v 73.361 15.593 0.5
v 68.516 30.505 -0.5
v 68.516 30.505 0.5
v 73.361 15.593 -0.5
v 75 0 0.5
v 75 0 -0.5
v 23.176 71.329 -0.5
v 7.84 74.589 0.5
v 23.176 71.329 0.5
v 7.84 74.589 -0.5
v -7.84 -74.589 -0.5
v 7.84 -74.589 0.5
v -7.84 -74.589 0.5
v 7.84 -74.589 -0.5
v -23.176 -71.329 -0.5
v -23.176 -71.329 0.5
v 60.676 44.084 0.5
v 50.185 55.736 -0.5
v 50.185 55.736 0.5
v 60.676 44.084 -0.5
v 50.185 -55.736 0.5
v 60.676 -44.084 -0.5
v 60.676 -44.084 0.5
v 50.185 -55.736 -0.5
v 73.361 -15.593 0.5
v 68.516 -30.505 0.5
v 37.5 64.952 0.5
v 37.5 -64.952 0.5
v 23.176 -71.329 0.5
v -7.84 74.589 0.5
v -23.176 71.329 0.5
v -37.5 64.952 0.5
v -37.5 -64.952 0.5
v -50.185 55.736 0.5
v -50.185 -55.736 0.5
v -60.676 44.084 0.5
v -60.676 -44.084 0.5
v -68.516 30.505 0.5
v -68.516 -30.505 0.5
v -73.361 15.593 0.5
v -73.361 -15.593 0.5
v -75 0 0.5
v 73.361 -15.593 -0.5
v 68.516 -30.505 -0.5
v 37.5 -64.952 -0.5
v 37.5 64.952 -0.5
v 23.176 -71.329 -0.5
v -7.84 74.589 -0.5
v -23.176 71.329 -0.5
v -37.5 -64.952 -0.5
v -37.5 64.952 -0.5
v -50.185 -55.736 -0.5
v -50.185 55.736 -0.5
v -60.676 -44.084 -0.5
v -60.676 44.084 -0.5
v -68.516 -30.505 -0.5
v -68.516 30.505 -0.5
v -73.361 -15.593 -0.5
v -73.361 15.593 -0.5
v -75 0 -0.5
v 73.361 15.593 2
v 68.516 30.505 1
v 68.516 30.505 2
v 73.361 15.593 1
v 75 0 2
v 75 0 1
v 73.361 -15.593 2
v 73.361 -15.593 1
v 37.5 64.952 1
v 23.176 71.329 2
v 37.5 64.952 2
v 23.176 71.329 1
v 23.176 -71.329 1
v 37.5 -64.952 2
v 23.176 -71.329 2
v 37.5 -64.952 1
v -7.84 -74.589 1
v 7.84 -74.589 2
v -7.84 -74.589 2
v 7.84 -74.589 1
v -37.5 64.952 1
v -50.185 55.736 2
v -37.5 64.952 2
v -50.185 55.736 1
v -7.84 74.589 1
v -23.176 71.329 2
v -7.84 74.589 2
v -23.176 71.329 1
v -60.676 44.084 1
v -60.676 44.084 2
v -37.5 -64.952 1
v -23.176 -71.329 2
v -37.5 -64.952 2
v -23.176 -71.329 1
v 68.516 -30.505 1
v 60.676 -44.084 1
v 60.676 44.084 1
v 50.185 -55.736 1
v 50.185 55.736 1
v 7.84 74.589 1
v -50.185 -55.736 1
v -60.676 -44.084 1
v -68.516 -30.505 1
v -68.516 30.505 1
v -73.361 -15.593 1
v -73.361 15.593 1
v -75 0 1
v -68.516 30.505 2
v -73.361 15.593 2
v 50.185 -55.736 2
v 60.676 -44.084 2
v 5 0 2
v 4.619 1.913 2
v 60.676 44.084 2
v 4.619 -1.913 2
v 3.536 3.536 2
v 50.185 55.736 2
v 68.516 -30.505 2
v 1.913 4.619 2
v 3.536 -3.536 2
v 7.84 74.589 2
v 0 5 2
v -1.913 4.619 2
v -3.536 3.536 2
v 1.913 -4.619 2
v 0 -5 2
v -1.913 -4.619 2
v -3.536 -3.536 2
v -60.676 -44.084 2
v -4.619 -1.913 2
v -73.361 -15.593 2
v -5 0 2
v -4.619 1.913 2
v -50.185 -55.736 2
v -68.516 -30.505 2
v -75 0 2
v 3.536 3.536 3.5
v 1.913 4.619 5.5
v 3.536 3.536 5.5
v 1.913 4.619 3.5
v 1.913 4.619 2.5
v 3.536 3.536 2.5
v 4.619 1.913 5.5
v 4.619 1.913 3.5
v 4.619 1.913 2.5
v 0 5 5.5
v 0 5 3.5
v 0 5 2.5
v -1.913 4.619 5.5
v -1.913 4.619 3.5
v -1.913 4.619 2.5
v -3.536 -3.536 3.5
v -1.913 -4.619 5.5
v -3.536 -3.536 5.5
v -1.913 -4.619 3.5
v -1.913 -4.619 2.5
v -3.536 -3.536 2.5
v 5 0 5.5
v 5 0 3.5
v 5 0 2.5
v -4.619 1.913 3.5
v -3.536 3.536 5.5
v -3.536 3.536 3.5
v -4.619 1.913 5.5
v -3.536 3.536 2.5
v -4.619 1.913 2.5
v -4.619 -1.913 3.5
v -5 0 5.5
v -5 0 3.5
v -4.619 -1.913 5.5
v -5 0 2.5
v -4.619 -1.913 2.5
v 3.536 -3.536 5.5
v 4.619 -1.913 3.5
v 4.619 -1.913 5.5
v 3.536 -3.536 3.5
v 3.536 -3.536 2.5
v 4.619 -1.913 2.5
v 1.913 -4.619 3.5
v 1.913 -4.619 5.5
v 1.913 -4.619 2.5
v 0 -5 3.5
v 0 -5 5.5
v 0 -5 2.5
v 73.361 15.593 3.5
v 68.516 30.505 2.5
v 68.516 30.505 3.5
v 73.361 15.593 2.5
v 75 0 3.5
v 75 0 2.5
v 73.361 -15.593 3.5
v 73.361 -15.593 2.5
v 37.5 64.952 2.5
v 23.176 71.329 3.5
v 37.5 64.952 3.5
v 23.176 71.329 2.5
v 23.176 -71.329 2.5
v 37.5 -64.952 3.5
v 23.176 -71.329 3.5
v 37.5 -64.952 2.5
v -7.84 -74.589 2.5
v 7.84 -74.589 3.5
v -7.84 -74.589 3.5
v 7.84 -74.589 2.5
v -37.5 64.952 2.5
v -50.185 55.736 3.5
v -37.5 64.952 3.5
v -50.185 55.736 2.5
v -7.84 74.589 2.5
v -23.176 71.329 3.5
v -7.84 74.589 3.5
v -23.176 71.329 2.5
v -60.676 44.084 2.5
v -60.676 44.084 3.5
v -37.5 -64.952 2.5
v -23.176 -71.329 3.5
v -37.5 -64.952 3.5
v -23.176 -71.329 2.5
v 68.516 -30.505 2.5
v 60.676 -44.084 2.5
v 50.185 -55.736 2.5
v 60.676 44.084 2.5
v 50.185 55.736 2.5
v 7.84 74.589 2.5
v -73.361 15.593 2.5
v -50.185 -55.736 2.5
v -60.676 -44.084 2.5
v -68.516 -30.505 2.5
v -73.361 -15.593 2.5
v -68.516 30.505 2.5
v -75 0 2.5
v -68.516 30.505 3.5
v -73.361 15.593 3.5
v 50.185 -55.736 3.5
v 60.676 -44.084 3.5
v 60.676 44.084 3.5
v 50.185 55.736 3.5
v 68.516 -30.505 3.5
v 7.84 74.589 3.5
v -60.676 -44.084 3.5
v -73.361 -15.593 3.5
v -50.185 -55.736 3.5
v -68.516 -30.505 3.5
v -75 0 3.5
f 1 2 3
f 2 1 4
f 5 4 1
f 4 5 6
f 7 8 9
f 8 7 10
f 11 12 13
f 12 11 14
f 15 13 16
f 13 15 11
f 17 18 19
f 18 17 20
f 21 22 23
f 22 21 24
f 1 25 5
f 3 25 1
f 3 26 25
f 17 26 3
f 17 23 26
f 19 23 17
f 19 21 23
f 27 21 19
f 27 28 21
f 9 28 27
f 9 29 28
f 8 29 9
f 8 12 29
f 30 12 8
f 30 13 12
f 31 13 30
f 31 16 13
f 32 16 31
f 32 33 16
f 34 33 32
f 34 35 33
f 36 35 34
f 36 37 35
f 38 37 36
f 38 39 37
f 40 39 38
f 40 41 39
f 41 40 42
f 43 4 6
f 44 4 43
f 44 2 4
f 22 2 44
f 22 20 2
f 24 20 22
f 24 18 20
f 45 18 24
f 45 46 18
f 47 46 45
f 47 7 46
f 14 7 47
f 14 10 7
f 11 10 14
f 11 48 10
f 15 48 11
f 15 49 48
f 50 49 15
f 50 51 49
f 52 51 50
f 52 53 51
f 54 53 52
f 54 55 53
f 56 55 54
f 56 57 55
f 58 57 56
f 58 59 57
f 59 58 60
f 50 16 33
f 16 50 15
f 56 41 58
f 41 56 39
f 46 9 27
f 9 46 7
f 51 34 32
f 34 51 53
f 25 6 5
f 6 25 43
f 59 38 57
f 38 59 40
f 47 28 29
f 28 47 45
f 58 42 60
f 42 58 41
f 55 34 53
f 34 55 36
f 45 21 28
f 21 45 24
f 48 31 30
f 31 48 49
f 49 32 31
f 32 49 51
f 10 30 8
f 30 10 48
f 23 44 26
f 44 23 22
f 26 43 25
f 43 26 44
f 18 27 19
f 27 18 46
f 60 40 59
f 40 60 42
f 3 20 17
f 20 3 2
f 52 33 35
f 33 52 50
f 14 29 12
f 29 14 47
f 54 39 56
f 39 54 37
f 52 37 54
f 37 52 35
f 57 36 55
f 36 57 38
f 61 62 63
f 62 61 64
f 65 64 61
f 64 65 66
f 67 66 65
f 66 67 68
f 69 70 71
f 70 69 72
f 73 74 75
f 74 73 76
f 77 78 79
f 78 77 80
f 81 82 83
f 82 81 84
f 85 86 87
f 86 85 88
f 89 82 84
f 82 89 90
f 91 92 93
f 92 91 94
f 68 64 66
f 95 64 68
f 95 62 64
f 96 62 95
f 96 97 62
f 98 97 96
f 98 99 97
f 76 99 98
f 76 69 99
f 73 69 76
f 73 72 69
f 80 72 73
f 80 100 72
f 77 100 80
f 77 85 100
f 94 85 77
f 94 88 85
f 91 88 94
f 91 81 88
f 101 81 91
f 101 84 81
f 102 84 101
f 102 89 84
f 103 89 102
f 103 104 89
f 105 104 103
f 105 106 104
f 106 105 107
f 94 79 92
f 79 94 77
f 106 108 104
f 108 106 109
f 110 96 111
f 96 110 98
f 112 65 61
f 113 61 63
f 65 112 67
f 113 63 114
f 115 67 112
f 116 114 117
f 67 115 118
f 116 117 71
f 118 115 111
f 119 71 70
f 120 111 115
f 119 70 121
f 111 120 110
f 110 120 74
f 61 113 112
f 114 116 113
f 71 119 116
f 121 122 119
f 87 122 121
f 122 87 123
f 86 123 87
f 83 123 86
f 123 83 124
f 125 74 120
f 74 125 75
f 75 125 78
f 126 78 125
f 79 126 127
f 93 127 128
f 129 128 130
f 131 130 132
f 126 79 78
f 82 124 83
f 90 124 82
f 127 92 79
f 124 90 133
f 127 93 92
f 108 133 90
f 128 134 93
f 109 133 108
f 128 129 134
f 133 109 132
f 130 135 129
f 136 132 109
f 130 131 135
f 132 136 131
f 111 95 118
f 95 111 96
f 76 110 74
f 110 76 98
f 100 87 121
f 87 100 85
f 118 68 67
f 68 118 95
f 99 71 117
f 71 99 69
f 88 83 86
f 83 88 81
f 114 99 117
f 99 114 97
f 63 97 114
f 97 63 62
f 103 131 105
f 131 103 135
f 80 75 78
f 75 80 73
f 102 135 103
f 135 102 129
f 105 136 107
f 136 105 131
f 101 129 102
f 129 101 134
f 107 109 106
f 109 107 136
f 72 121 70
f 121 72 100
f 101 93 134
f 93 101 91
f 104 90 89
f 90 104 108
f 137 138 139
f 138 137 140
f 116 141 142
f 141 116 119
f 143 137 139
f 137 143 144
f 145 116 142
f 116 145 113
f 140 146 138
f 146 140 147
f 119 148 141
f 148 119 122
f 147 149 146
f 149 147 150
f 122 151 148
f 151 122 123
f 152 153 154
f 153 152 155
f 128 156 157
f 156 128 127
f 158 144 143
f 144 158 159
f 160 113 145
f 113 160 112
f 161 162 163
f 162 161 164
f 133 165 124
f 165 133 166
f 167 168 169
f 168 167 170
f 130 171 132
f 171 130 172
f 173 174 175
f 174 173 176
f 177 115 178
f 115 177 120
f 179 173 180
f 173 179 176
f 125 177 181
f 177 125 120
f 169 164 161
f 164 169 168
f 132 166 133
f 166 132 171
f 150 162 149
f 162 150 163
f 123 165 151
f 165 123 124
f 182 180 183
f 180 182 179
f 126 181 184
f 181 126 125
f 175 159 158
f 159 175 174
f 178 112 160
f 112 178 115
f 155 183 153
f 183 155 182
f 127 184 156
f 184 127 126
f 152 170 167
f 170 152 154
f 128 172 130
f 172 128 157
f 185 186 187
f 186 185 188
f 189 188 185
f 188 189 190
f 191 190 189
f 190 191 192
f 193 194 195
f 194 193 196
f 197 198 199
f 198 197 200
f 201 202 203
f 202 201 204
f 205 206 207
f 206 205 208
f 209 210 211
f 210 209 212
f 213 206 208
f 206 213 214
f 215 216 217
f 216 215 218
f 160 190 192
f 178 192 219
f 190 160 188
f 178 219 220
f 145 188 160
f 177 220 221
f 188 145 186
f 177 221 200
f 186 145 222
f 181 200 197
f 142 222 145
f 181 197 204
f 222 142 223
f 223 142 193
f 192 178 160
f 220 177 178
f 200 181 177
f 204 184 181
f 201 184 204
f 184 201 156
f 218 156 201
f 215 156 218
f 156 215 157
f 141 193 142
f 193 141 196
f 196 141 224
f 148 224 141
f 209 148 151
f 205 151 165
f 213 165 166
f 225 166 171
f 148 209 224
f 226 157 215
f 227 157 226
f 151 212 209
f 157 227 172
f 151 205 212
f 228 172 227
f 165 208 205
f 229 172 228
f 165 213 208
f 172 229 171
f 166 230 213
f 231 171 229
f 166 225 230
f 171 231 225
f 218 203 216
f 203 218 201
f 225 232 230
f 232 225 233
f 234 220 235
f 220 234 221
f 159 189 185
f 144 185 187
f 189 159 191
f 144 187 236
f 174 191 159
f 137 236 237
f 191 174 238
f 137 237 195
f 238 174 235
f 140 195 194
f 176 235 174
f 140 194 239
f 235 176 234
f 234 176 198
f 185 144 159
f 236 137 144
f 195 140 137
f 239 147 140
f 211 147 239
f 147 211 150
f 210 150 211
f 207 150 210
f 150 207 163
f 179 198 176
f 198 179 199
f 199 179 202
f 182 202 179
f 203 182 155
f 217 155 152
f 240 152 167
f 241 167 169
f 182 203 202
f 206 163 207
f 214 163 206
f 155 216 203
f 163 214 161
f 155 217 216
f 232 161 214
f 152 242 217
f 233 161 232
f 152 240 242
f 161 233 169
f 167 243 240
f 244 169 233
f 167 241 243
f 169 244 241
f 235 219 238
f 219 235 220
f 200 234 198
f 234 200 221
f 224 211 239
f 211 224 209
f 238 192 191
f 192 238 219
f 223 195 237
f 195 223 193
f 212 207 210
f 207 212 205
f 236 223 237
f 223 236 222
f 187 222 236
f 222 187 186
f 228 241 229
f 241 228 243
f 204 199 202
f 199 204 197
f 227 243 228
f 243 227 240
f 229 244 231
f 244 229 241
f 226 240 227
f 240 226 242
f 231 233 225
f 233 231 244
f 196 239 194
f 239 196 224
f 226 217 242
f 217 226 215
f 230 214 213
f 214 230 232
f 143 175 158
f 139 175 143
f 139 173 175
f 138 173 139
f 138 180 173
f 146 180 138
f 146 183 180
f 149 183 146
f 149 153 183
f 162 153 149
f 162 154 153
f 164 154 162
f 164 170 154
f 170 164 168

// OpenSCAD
// Parameters for customization
base_diameter = 150;          // Diameter of the plates (mm)
pivot_diameter = 10;          // Diameter of the central pivot (mm)
plate_thickness = 1;          // Thickness of each stainless steel plate (mm)
air_channel_width = 20;       // Width of airflow channels (mm)
num_air_channels = 6;         // Number of airflow channels
rotation_limit = 45;          // Maximum rotation of middle and top plates (degrees)

// Main function
module air_regulator_system() {
    translate([0, 0, 0])
    base_plate();
    
    translate([0, 0, plate_thickness + 0.5])
    middle_plate();
    
    translate([0, 0, 2 * (plate_thickness + 0.5)])
    top_plate();
}

// Base Plate: Fixed component with open channels
module base_plate() {
    difference() {
        // Circular base
        cylinder(r=base_diameter / 2, h=plate_thickness, center=true);

        // Airflow channels
        for (i = [0 : 360 / num_air_channels : 360 - 360 / num_air_channels]) {
            rotate([0, 0, i])
            translate([base_diameter / 4, 0, 0])
            square_air_channel();
        }
    }
}

// Middle Plate: Rotatable component with partially overlapping channels
module middle_plate() {
    difference() {
        // Circular middle plate
        cylinder(r=base_diameter / 2, h=plate_thickness, center=true);

        // Adjustable airflow slots
        for (i = [0 : 360 / num_air_channels : 360 - 360 / num_air_channels]) {
            rotate([0, 0, i])
            translate([base_diameter / 4, 0, 0])
            square_air_channel(size_factor=0.8); // Slightly narrower slots
        }
    }

    // Add rotation indicator
    rotate([0, 0, rotation_limit / 2])
    translate([0, 0, plate_thickness + 0.5])
    cylinder(r=pivot_diameter / 2, h=2, center=true); // Central pivot hole
}

// Top Plate: Rotatable component with fine control slots
module top_plate() {
    difference() {
        // Circular top plate
        cylinder(r=base_diameter / 2, h=plate_thickness, center=true);

        // Smaller control slots for precise airflow adjustment
        for (i = [0 : 360 / num_air_channels : 360 - 360 / num_air_channels]) {
            rotate([0, 0, i + rotation_limit / 2])
            translate([base_diameter / 4, 0, 0])
            square_air_channel(size_factor=0.6); // Even narrower slots
        }
    }

    // Add rotation indicator
    rotate([0, 0, -rotation_limit / 2])
    translate([0, 0, plate_thickness + 0.5])
    cylinder(r=pivot_diameter / 2, h=2, center=true); // Central pivot hole
}

// Module for creating square air channels
module square_air_channel(size_factor=1) {
    square([air_channel_width * size_factor, air_channel_width * size_factor], center=true);
}

// Main program call
air_regulator_system();
